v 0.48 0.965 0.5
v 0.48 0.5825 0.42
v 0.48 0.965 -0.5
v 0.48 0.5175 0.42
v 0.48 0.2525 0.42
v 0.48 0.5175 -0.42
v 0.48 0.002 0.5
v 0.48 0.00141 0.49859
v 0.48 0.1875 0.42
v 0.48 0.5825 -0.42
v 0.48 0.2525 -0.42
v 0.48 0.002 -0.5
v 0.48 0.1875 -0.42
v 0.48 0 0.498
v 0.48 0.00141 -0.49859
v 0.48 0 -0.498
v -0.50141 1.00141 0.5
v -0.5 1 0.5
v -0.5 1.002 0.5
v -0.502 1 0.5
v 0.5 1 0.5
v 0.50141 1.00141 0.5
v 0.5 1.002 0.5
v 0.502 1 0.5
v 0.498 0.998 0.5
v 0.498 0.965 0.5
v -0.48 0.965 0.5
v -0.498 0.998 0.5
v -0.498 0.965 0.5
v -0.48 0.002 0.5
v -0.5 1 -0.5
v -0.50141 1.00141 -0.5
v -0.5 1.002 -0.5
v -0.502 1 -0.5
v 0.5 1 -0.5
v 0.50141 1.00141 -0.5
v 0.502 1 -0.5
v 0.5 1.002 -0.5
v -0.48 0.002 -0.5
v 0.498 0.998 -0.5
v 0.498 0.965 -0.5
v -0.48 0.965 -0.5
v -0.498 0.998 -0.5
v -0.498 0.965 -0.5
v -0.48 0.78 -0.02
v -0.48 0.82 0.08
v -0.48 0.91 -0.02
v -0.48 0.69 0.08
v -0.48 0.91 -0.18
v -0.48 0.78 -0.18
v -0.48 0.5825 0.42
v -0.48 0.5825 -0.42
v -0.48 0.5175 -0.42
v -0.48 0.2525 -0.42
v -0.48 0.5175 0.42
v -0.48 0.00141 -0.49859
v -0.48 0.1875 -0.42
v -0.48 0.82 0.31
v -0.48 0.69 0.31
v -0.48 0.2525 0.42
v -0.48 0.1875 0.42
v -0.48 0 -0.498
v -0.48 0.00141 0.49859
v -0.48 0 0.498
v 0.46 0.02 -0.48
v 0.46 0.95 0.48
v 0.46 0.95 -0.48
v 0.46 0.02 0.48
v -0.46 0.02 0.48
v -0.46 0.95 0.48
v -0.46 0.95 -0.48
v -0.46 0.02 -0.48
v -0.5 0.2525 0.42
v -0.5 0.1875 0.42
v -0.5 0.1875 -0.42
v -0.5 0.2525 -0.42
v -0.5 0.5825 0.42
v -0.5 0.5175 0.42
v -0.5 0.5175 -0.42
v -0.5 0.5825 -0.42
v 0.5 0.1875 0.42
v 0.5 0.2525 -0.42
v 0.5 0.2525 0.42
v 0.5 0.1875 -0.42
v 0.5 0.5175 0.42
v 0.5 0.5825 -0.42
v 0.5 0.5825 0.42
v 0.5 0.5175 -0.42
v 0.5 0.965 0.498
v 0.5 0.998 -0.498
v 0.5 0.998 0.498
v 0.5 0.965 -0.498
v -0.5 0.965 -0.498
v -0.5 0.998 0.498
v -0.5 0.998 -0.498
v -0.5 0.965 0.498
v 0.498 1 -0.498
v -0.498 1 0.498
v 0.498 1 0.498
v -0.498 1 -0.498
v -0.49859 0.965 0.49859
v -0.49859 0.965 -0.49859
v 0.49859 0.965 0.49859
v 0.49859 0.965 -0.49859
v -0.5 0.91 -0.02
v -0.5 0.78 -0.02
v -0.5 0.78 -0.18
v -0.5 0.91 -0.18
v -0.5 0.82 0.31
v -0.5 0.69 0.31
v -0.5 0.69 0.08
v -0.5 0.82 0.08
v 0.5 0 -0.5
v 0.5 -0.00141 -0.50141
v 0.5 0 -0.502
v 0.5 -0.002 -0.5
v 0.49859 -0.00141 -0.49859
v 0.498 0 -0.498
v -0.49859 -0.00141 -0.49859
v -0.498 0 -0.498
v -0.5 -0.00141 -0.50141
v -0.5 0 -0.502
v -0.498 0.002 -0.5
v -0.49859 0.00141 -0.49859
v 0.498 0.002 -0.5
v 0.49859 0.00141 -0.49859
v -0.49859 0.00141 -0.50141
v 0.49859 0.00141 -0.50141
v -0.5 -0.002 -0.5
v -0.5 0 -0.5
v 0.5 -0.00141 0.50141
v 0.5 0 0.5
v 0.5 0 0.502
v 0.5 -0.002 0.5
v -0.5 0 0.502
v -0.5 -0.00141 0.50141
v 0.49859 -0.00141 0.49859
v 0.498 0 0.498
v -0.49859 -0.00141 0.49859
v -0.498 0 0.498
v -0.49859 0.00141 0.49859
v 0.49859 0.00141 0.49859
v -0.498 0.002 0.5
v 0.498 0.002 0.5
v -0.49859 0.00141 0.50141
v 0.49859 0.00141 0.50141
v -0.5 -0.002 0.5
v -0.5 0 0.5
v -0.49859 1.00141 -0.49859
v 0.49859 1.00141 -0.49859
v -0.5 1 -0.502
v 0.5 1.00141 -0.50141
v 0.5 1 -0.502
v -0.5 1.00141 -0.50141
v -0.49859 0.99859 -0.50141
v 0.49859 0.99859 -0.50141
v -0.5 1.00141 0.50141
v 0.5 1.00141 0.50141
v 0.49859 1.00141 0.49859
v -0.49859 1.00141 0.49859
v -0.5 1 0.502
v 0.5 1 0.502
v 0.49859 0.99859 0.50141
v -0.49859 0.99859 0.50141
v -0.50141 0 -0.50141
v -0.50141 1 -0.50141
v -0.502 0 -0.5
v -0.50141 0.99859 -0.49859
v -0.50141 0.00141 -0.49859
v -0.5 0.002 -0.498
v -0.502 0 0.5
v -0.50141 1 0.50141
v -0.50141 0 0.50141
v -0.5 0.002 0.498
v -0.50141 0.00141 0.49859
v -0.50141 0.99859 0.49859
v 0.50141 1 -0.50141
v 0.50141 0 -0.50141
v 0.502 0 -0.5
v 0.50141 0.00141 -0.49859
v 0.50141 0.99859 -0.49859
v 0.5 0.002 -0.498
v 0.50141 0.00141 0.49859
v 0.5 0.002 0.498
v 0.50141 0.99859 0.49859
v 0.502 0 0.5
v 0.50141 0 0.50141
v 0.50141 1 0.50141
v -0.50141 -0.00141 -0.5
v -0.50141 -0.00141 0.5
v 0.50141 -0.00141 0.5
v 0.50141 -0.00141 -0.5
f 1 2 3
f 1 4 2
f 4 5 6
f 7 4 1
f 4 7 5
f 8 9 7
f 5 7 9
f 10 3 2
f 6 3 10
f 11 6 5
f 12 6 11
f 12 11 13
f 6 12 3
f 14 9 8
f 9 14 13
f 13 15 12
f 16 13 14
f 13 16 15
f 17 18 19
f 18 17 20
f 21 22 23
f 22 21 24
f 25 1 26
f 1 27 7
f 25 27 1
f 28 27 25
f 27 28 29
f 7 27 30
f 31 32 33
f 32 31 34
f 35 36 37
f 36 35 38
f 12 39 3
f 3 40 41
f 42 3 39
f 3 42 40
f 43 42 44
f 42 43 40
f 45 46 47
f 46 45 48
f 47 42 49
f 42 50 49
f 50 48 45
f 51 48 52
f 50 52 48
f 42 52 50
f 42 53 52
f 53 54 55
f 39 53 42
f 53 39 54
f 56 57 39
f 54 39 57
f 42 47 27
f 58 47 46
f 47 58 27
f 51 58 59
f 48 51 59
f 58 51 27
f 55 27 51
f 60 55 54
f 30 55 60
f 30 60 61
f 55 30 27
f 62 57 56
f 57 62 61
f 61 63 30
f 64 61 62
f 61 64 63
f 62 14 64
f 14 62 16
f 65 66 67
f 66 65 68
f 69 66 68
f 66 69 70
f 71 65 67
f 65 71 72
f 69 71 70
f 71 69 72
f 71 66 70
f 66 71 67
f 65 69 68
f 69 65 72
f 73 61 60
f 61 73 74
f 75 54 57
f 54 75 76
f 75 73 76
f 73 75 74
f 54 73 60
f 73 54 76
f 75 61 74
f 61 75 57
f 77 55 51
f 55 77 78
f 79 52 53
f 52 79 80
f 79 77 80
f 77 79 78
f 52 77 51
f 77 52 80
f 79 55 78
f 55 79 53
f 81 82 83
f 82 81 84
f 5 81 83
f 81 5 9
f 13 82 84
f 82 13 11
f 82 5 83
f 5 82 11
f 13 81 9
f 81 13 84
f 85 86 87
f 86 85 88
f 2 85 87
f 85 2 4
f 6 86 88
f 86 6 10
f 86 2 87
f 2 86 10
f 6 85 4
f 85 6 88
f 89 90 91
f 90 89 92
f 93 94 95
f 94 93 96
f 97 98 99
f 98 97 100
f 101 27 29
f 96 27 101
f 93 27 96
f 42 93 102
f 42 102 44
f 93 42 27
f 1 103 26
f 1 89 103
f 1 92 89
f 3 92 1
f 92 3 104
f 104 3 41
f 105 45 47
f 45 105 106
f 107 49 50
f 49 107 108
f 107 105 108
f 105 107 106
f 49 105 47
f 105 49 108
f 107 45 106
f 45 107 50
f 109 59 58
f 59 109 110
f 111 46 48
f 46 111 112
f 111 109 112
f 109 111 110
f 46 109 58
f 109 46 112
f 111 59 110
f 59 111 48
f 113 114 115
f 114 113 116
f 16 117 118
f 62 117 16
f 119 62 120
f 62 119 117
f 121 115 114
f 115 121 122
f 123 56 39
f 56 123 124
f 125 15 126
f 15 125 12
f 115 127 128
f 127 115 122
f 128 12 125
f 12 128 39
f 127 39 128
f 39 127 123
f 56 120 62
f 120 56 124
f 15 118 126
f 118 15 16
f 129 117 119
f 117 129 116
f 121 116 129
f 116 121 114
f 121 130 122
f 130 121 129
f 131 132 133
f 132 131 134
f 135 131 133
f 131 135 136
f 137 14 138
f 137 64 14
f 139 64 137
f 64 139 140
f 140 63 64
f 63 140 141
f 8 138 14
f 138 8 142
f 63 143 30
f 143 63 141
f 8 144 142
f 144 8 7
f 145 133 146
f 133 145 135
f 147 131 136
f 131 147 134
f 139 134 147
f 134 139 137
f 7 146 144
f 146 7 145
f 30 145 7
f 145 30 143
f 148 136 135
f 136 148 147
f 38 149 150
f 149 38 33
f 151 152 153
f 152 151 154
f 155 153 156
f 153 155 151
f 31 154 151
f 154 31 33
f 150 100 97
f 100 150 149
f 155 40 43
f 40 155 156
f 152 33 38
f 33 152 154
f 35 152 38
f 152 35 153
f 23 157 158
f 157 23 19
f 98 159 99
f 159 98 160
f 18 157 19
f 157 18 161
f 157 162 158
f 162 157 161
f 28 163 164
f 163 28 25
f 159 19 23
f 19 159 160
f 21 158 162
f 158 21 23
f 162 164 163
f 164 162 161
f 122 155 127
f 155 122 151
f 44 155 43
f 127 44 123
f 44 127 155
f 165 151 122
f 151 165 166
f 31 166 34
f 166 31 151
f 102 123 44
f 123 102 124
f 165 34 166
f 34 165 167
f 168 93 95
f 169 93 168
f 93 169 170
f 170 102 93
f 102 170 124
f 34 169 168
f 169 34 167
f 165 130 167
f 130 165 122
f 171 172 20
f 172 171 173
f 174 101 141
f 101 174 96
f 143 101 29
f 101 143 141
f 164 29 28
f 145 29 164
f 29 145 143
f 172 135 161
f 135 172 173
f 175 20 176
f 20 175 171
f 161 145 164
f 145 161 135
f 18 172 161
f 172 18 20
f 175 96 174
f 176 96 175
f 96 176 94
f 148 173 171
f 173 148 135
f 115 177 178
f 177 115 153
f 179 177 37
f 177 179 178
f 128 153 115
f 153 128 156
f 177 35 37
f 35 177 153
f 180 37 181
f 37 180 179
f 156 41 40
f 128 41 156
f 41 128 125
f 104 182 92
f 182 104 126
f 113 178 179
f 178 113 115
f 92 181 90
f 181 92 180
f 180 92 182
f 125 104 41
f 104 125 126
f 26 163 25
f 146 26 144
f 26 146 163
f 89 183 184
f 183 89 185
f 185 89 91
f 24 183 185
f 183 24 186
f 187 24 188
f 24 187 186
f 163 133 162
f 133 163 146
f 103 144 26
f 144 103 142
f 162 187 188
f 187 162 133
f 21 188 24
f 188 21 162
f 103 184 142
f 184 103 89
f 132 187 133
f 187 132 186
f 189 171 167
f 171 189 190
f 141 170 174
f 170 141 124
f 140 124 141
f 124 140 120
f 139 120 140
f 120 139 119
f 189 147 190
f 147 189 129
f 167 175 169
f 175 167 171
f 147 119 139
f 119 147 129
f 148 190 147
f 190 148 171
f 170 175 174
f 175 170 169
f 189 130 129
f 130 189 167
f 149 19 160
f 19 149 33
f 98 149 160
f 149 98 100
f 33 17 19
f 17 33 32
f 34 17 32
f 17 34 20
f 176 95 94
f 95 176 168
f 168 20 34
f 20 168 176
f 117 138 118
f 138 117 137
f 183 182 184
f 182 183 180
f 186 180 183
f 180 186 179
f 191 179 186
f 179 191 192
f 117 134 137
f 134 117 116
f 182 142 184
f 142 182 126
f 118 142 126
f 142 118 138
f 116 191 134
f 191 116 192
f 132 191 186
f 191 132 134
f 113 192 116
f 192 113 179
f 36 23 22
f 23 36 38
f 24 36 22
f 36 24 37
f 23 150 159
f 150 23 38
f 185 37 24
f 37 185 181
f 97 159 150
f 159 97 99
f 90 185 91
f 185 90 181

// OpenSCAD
// file: belt-box.scad
// Unit rack: x width, y height, z length; bottom centre at origin.
wall=0.02;
module belt_box(){
 union(){
  // Closed shell, inset long sides make room for shallow pressed ribs.
  difference(){translate([-.48,0,-.5]) cube([.96,.97,1]); translate([-.48+wall,wall,-.5+wall]) cube([.96-2*wall,.97-2*wall,1-2*wall]);}
  // Lid lip and its inset seam.
  translate([-.5,.965,-.5]) cube([1,.035,1]);
  for(s=[-1,1], y=[.22,.55]) translate([s*.49,y,0]) cube([.02,.065,.84],center=true);
  // Shallow front latch and identification plate.
  translate([-.5,.78,-.18]) cube([.025,.13,.16]);
  translate([-.5,.69,.08]) cube([.025,.13,.23]);
 }
}
belt_box();
// main file
use <belt-box.scad>
color("#8E9296") belt_box();
color("yellow") for(y=[0,1],z=[-.5,.5]) translate([-.5,y,z]) rotate([0,90,0]) cylinder(h=1,r=.002,$fn=8);
color("yellow") for(x=[-.5,.5],z=[-.5,.5]) translate([x,0,z]) rotate([-90,0,0]) cylinder(h=1,r=.002,$fn=8);
color("yellow") for(x=[-.5,.5],y=[0,1]) translate([x,y,-.5]) cylinder(h=1,r=.002,$fn=8);
